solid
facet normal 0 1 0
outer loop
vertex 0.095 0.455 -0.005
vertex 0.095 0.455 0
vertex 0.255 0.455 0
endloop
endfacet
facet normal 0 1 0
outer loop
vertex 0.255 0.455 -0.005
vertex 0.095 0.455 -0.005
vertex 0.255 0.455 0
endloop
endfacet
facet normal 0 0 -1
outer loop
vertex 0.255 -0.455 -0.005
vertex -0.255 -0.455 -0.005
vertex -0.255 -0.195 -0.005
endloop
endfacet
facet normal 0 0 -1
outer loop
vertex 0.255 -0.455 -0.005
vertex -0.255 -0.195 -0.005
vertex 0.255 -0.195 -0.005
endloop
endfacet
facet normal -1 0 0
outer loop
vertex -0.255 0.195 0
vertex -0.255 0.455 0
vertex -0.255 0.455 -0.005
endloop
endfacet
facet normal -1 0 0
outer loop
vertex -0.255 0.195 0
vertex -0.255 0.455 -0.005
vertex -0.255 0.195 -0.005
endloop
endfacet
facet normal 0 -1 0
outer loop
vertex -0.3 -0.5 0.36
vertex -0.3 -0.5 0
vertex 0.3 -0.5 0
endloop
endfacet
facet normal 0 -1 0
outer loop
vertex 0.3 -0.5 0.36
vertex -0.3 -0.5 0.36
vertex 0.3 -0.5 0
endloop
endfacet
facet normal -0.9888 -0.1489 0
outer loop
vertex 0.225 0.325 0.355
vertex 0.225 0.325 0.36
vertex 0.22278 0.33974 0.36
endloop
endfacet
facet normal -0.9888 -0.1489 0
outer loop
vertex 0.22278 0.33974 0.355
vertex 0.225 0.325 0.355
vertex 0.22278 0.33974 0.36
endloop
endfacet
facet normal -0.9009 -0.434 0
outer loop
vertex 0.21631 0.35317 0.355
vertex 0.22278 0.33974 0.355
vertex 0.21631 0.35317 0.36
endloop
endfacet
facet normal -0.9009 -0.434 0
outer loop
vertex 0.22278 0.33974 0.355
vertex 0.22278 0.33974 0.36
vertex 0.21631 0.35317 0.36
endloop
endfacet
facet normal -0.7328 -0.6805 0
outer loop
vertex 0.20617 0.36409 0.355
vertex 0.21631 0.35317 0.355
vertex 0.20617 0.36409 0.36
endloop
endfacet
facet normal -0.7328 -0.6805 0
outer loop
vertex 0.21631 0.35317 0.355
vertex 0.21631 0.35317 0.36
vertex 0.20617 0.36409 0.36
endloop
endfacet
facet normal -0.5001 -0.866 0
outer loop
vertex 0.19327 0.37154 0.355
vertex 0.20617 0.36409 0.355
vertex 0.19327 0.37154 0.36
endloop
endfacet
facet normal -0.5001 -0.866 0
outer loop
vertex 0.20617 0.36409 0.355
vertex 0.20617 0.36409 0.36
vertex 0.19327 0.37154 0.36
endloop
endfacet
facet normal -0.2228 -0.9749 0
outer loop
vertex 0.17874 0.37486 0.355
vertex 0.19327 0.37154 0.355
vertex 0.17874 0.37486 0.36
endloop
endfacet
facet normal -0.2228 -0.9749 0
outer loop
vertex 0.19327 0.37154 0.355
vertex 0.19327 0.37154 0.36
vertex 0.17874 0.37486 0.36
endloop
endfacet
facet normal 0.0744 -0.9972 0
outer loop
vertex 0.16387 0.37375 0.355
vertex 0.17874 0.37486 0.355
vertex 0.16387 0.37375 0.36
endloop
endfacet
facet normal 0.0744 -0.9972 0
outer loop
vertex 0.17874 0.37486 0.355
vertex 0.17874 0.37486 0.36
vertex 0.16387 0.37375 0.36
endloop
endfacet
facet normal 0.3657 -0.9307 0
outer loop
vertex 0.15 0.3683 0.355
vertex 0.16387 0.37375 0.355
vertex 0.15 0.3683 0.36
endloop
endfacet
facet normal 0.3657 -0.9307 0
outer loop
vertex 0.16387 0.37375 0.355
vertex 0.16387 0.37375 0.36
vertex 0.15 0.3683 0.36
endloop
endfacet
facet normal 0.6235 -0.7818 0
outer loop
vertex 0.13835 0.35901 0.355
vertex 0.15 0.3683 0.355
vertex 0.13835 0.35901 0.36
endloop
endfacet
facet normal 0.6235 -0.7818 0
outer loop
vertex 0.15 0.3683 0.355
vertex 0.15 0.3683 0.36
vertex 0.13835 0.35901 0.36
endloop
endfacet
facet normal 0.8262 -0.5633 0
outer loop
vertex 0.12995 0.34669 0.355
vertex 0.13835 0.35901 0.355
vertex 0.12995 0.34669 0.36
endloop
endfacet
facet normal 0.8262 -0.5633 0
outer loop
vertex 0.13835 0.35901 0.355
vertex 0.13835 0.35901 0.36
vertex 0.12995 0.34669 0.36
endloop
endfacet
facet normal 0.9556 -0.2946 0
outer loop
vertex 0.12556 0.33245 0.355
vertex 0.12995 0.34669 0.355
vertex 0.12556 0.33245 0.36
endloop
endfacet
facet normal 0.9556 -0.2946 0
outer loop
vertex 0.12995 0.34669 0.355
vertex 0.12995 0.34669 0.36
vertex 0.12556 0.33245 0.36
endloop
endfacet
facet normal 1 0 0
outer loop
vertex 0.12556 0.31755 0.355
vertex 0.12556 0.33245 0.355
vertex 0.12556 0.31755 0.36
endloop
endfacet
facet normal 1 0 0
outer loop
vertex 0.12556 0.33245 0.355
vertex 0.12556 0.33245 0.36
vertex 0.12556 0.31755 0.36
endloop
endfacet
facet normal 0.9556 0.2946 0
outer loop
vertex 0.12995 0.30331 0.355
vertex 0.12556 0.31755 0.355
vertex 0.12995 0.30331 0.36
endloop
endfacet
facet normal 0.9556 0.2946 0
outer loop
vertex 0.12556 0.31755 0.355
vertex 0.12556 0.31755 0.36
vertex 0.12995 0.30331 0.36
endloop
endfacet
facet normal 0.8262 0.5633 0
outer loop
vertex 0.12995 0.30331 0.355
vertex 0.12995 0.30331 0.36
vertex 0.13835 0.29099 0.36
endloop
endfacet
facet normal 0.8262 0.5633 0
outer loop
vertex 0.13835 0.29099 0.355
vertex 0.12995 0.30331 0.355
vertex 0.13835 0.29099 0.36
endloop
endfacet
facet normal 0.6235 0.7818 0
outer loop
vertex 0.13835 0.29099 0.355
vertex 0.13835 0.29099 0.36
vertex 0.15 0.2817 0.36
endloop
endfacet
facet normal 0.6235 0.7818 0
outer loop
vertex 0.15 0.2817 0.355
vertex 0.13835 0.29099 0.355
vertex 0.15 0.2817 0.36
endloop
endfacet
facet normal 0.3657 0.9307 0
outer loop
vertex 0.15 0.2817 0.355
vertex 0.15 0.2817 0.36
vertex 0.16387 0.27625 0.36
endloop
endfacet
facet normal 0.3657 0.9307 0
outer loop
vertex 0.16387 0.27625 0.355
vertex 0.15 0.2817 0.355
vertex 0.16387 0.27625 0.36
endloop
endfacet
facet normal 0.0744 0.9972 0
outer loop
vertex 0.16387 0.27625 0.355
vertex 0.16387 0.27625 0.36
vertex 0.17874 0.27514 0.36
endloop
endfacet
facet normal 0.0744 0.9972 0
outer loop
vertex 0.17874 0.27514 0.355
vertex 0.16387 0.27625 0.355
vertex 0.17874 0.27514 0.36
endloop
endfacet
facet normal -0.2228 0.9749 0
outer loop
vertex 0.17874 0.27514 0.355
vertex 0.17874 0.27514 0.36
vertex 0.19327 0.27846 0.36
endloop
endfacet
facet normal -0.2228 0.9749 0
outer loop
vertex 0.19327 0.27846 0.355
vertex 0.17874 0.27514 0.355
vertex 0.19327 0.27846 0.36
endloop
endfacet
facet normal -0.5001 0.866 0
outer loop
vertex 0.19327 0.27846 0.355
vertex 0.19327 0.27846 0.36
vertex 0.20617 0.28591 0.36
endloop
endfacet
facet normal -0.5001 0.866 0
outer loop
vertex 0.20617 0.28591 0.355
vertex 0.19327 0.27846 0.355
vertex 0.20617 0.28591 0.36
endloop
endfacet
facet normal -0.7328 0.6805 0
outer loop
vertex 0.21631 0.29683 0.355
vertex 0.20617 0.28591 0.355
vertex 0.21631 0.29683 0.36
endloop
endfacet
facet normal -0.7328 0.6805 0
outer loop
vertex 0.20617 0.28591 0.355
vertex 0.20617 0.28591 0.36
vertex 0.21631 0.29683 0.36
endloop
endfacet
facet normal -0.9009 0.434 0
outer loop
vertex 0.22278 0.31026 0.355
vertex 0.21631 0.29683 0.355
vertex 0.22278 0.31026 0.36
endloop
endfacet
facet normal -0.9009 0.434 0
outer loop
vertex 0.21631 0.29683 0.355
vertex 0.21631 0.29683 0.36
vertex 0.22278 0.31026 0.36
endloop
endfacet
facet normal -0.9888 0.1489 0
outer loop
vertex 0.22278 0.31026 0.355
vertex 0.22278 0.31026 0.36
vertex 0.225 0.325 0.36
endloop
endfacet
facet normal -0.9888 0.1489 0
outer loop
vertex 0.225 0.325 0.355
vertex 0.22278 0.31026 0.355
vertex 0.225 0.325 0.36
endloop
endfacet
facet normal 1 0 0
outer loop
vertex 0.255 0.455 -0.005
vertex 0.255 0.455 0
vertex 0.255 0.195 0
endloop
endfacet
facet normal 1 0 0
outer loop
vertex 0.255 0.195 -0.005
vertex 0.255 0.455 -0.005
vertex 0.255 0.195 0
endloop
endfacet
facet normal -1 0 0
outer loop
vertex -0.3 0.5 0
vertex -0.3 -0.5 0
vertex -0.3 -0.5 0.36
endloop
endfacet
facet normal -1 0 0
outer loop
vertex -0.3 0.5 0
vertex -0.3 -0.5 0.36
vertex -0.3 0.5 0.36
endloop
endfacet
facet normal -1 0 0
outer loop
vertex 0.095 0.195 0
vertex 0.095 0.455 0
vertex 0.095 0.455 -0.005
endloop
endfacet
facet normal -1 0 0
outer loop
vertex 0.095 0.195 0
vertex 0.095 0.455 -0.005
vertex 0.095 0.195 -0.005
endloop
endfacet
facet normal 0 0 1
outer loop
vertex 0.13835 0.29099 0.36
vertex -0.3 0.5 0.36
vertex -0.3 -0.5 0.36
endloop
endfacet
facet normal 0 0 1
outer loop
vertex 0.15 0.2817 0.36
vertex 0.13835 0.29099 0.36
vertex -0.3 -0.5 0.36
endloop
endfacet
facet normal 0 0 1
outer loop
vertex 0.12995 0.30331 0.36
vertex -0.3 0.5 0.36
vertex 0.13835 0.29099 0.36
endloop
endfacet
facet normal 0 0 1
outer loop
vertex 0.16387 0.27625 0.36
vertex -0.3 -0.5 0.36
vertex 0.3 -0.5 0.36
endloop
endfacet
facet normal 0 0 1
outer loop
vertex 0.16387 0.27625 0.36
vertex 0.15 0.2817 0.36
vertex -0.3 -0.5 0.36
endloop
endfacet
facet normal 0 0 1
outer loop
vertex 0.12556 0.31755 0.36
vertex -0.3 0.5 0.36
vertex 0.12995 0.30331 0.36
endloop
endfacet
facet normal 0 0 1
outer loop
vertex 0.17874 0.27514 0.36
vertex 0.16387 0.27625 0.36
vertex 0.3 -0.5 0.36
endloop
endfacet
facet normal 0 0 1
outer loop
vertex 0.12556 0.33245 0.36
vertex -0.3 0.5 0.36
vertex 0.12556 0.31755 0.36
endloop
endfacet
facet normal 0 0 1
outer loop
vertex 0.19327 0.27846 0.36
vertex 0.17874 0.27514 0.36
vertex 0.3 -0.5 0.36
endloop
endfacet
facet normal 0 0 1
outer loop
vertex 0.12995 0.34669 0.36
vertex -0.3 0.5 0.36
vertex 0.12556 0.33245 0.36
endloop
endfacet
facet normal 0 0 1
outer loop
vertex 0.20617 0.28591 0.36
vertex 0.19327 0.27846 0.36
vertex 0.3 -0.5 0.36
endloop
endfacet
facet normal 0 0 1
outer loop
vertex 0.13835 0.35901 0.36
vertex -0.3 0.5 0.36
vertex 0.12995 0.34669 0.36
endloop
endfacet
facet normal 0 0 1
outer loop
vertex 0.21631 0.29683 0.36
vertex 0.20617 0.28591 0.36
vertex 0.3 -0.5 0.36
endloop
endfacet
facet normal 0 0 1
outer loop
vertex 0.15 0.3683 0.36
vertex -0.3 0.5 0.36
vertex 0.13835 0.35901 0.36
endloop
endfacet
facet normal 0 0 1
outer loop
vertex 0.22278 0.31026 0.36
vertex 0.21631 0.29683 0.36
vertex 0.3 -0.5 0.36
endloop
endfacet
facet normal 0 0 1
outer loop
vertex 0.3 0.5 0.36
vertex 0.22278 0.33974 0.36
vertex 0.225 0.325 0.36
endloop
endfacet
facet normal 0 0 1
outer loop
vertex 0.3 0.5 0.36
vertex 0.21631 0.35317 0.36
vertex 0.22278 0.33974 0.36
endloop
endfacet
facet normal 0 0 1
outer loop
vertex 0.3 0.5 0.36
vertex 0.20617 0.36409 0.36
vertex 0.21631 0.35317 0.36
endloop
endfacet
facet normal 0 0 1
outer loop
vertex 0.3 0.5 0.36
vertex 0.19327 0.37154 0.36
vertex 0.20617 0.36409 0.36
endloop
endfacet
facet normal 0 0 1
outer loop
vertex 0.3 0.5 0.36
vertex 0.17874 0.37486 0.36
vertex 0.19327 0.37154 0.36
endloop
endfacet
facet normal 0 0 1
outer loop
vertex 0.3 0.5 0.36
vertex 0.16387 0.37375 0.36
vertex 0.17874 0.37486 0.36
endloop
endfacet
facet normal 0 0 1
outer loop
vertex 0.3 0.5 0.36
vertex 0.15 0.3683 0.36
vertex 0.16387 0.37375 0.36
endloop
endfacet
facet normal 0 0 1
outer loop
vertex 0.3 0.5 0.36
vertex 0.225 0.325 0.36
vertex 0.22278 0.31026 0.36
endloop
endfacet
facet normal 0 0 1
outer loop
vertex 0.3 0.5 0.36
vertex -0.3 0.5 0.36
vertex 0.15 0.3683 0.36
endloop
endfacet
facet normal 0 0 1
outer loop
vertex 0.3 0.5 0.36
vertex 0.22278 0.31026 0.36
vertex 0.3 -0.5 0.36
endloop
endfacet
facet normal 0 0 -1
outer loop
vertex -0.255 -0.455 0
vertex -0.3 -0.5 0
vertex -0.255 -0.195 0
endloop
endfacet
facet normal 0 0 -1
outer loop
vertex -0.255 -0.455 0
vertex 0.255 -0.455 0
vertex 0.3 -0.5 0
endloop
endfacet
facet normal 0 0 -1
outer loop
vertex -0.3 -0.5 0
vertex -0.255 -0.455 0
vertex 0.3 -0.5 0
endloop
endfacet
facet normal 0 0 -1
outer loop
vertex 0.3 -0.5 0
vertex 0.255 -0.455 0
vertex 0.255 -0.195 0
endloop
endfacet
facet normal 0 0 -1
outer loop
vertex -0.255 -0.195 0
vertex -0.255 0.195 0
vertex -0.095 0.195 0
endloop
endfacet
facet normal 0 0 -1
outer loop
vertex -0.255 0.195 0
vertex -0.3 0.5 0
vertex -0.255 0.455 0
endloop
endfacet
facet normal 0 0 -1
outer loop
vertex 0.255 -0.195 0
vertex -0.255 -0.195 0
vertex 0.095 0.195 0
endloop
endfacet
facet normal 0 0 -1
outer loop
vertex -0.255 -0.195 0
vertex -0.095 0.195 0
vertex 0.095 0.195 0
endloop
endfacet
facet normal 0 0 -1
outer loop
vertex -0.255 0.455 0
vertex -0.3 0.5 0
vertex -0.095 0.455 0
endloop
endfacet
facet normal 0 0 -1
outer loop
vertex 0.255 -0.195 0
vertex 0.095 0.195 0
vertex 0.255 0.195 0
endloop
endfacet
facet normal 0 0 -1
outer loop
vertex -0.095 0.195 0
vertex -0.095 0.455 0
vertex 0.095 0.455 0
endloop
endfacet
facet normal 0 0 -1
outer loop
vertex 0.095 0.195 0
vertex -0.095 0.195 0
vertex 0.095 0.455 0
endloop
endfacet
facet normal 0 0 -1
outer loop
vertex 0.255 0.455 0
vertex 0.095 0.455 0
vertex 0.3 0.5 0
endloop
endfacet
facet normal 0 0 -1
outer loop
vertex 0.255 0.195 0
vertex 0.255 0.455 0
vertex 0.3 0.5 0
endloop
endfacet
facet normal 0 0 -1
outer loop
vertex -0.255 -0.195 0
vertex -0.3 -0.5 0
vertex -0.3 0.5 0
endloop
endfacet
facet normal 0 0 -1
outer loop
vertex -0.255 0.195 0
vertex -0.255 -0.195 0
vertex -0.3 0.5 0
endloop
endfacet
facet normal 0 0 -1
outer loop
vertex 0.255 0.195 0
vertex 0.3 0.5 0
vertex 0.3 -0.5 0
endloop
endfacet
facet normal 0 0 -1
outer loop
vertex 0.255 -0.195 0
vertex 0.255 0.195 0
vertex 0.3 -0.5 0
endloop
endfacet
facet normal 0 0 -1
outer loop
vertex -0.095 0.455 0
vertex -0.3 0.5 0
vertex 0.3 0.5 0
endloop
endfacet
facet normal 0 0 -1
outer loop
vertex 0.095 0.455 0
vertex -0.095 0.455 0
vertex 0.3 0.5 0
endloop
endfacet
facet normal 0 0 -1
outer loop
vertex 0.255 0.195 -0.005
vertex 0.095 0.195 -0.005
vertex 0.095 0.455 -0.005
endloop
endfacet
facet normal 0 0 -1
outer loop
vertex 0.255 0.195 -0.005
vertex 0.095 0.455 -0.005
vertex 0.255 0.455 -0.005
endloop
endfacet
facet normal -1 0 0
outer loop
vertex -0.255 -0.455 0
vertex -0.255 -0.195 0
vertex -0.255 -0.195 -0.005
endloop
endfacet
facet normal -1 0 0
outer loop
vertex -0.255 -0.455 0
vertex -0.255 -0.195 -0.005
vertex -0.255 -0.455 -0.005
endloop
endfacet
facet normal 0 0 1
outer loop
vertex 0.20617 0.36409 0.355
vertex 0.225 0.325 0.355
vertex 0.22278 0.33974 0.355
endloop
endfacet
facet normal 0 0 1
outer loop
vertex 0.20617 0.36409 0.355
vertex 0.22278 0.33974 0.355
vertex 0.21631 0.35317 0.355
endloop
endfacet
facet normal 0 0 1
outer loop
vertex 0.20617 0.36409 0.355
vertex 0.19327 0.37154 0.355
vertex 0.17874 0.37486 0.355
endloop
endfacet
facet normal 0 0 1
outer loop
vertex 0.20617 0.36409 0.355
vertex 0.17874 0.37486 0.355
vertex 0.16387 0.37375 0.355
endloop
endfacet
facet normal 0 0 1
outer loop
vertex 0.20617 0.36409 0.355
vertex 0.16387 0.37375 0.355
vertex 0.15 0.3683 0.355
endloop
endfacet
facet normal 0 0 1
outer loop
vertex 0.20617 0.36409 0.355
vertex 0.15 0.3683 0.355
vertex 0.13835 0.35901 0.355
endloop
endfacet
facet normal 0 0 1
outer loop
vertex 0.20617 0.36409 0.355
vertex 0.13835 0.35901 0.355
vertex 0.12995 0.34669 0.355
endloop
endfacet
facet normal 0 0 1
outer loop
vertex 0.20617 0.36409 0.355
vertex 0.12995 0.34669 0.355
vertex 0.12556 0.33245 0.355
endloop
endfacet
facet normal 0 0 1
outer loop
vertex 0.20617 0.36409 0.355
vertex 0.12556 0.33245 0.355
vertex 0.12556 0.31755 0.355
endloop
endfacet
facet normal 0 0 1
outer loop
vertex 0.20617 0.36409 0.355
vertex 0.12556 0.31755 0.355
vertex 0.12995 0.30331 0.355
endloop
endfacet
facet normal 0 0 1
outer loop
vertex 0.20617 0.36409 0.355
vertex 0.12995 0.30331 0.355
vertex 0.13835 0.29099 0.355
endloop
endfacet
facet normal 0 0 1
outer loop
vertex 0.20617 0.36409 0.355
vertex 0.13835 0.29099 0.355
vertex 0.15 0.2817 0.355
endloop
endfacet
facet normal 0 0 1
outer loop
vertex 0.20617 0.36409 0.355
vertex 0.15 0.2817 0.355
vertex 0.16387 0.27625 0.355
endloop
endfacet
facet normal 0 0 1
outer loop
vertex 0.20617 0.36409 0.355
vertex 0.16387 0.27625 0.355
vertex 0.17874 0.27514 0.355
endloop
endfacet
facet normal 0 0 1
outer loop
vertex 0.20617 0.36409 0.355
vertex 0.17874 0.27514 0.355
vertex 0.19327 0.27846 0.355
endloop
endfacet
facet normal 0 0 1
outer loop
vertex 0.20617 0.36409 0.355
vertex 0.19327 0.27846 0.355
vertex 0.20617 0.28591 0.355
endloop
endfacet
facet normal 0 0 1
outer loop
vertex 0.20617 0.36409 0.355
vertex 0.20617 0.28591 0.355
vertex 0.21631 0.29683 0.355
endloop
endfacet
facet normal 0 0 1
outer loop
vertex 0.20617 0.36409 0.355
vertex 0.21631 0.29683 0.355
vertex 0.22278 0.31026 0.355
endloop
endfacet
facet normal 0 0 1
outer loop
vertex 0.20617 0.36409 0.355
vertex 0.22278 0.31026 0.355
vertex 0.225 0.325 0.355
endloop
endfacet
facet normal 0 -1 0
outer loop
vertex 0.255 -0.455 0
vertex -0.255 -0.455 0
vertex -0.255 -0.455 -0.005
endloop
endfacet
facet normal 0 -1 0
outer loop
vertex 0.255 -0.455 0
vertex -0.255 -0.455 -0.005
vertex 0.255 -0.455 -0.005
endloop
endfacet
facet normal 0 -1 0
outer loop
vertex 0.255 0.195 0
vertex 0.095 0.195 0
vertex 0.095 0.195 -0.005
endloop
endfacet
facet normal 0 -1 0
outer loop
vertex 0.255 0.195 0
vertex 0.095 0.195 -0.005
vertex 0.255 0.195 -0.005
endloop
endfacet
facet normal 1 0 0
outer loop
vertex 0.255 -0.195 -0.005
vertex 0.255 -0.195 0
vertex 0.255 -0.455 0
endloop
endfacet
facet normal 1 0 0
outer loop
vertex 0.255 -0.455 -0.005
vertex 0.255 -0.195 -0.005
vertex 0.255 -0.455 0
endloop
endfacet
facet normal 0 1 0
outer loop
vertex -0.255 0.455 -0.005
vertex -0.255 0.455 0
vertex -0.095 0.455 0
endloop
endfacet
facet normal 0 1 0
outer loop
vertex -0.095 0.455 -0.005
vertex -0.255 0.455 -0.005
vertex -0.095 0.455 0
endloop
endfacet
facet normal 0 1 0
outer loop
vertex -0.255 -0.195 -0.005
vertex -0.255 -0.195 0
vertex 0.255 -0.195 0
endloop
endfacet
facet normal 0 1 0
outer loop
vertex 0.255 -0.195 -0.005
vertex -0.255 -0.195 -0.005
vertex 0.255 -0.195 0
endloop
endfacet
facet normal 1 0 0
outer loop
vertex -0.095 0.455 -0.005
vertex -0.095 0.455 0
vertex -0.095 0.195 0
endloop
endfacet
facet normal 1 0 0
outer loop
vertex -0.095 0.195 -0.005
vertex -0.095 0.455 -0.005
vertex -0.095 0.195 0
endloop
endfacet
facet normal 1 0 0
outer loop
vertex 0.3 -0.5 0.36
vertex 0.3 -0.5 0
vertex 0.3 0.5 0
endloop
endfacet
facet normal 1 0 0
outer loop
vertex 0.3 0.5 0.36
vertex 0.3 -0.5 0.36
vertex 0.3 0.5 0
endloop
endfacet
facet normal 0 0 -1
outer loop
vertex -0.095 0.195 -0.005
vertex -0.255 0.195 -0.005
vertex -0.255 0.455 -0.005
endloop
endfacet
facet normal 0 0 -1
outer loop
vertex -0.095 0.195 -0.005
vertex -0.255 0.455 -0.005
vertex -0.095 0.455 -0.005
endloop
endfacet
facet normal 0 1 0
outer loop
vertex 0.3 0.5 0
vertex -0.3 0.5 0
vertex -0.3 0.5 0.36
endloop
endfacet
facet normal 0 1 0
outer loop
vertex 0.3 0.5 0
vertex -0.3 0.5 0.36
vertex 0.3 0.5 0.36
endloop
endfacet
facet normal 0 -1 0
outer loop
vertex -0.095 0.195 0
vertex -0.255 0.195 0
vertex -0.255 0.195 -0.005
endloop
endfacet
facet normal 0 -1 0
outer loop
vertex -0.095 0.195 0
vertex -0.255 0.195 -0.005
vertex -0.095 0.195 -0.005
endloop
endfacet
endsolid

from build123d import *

# Parameters (mm, degrees)
SKETCH_W      = 0.6
SKETCH_H      = 1
PAD_DEPTH     = 0.36
SKETCH001_R   = 0.05
POCKET_DEPTH  = 0.005
SKETCH002_W   = 0.16
SKETCH002_H   = 0.26
SKETCH002_W_2 = 0.51
PAD001_DEPTH  = 0.005


with BuildPart() as part:
    # Sketch → Pad (new body)
    with BuildSketch(Plane.XY):
        Rectangle(SKETCH_W, SKETCH_H)
    extrude(amount=PAD_DEPTH)

    # Sketch001 (on Face6 of Pad) → Pocket (cut)
    with BuildSketch(Plane.XY.offset(0.36)):
        with Locations((0.175, 0.325)):
            Circle(SKETCH001_R)
    extrude(amount=-POCKET_DEPTH, mode=Mode.SUBTRACT)

    # Sketch002 (on Face4 of Pocket) → Pad001 (join)
    with BuildSketch(Plane(origin=(0, 0, 0), x_dir=(1, 0, 0), z_dir=(0, 0, -1))):
        with Locations((0.175, -0.325)):
            Rectangle(SKETCH002_W, SKETCH002_H)
        with Locations((0, 0.325)):
            Rectangle(SKETCH002_W_2, SKETCH002_H)
        with Locations((-0.175, -0.325)):
            Rectangle(SKETCH002_W, SKETCH002_H)
    extrude(amount=PAD001_DEPTH)


solid = part.part
